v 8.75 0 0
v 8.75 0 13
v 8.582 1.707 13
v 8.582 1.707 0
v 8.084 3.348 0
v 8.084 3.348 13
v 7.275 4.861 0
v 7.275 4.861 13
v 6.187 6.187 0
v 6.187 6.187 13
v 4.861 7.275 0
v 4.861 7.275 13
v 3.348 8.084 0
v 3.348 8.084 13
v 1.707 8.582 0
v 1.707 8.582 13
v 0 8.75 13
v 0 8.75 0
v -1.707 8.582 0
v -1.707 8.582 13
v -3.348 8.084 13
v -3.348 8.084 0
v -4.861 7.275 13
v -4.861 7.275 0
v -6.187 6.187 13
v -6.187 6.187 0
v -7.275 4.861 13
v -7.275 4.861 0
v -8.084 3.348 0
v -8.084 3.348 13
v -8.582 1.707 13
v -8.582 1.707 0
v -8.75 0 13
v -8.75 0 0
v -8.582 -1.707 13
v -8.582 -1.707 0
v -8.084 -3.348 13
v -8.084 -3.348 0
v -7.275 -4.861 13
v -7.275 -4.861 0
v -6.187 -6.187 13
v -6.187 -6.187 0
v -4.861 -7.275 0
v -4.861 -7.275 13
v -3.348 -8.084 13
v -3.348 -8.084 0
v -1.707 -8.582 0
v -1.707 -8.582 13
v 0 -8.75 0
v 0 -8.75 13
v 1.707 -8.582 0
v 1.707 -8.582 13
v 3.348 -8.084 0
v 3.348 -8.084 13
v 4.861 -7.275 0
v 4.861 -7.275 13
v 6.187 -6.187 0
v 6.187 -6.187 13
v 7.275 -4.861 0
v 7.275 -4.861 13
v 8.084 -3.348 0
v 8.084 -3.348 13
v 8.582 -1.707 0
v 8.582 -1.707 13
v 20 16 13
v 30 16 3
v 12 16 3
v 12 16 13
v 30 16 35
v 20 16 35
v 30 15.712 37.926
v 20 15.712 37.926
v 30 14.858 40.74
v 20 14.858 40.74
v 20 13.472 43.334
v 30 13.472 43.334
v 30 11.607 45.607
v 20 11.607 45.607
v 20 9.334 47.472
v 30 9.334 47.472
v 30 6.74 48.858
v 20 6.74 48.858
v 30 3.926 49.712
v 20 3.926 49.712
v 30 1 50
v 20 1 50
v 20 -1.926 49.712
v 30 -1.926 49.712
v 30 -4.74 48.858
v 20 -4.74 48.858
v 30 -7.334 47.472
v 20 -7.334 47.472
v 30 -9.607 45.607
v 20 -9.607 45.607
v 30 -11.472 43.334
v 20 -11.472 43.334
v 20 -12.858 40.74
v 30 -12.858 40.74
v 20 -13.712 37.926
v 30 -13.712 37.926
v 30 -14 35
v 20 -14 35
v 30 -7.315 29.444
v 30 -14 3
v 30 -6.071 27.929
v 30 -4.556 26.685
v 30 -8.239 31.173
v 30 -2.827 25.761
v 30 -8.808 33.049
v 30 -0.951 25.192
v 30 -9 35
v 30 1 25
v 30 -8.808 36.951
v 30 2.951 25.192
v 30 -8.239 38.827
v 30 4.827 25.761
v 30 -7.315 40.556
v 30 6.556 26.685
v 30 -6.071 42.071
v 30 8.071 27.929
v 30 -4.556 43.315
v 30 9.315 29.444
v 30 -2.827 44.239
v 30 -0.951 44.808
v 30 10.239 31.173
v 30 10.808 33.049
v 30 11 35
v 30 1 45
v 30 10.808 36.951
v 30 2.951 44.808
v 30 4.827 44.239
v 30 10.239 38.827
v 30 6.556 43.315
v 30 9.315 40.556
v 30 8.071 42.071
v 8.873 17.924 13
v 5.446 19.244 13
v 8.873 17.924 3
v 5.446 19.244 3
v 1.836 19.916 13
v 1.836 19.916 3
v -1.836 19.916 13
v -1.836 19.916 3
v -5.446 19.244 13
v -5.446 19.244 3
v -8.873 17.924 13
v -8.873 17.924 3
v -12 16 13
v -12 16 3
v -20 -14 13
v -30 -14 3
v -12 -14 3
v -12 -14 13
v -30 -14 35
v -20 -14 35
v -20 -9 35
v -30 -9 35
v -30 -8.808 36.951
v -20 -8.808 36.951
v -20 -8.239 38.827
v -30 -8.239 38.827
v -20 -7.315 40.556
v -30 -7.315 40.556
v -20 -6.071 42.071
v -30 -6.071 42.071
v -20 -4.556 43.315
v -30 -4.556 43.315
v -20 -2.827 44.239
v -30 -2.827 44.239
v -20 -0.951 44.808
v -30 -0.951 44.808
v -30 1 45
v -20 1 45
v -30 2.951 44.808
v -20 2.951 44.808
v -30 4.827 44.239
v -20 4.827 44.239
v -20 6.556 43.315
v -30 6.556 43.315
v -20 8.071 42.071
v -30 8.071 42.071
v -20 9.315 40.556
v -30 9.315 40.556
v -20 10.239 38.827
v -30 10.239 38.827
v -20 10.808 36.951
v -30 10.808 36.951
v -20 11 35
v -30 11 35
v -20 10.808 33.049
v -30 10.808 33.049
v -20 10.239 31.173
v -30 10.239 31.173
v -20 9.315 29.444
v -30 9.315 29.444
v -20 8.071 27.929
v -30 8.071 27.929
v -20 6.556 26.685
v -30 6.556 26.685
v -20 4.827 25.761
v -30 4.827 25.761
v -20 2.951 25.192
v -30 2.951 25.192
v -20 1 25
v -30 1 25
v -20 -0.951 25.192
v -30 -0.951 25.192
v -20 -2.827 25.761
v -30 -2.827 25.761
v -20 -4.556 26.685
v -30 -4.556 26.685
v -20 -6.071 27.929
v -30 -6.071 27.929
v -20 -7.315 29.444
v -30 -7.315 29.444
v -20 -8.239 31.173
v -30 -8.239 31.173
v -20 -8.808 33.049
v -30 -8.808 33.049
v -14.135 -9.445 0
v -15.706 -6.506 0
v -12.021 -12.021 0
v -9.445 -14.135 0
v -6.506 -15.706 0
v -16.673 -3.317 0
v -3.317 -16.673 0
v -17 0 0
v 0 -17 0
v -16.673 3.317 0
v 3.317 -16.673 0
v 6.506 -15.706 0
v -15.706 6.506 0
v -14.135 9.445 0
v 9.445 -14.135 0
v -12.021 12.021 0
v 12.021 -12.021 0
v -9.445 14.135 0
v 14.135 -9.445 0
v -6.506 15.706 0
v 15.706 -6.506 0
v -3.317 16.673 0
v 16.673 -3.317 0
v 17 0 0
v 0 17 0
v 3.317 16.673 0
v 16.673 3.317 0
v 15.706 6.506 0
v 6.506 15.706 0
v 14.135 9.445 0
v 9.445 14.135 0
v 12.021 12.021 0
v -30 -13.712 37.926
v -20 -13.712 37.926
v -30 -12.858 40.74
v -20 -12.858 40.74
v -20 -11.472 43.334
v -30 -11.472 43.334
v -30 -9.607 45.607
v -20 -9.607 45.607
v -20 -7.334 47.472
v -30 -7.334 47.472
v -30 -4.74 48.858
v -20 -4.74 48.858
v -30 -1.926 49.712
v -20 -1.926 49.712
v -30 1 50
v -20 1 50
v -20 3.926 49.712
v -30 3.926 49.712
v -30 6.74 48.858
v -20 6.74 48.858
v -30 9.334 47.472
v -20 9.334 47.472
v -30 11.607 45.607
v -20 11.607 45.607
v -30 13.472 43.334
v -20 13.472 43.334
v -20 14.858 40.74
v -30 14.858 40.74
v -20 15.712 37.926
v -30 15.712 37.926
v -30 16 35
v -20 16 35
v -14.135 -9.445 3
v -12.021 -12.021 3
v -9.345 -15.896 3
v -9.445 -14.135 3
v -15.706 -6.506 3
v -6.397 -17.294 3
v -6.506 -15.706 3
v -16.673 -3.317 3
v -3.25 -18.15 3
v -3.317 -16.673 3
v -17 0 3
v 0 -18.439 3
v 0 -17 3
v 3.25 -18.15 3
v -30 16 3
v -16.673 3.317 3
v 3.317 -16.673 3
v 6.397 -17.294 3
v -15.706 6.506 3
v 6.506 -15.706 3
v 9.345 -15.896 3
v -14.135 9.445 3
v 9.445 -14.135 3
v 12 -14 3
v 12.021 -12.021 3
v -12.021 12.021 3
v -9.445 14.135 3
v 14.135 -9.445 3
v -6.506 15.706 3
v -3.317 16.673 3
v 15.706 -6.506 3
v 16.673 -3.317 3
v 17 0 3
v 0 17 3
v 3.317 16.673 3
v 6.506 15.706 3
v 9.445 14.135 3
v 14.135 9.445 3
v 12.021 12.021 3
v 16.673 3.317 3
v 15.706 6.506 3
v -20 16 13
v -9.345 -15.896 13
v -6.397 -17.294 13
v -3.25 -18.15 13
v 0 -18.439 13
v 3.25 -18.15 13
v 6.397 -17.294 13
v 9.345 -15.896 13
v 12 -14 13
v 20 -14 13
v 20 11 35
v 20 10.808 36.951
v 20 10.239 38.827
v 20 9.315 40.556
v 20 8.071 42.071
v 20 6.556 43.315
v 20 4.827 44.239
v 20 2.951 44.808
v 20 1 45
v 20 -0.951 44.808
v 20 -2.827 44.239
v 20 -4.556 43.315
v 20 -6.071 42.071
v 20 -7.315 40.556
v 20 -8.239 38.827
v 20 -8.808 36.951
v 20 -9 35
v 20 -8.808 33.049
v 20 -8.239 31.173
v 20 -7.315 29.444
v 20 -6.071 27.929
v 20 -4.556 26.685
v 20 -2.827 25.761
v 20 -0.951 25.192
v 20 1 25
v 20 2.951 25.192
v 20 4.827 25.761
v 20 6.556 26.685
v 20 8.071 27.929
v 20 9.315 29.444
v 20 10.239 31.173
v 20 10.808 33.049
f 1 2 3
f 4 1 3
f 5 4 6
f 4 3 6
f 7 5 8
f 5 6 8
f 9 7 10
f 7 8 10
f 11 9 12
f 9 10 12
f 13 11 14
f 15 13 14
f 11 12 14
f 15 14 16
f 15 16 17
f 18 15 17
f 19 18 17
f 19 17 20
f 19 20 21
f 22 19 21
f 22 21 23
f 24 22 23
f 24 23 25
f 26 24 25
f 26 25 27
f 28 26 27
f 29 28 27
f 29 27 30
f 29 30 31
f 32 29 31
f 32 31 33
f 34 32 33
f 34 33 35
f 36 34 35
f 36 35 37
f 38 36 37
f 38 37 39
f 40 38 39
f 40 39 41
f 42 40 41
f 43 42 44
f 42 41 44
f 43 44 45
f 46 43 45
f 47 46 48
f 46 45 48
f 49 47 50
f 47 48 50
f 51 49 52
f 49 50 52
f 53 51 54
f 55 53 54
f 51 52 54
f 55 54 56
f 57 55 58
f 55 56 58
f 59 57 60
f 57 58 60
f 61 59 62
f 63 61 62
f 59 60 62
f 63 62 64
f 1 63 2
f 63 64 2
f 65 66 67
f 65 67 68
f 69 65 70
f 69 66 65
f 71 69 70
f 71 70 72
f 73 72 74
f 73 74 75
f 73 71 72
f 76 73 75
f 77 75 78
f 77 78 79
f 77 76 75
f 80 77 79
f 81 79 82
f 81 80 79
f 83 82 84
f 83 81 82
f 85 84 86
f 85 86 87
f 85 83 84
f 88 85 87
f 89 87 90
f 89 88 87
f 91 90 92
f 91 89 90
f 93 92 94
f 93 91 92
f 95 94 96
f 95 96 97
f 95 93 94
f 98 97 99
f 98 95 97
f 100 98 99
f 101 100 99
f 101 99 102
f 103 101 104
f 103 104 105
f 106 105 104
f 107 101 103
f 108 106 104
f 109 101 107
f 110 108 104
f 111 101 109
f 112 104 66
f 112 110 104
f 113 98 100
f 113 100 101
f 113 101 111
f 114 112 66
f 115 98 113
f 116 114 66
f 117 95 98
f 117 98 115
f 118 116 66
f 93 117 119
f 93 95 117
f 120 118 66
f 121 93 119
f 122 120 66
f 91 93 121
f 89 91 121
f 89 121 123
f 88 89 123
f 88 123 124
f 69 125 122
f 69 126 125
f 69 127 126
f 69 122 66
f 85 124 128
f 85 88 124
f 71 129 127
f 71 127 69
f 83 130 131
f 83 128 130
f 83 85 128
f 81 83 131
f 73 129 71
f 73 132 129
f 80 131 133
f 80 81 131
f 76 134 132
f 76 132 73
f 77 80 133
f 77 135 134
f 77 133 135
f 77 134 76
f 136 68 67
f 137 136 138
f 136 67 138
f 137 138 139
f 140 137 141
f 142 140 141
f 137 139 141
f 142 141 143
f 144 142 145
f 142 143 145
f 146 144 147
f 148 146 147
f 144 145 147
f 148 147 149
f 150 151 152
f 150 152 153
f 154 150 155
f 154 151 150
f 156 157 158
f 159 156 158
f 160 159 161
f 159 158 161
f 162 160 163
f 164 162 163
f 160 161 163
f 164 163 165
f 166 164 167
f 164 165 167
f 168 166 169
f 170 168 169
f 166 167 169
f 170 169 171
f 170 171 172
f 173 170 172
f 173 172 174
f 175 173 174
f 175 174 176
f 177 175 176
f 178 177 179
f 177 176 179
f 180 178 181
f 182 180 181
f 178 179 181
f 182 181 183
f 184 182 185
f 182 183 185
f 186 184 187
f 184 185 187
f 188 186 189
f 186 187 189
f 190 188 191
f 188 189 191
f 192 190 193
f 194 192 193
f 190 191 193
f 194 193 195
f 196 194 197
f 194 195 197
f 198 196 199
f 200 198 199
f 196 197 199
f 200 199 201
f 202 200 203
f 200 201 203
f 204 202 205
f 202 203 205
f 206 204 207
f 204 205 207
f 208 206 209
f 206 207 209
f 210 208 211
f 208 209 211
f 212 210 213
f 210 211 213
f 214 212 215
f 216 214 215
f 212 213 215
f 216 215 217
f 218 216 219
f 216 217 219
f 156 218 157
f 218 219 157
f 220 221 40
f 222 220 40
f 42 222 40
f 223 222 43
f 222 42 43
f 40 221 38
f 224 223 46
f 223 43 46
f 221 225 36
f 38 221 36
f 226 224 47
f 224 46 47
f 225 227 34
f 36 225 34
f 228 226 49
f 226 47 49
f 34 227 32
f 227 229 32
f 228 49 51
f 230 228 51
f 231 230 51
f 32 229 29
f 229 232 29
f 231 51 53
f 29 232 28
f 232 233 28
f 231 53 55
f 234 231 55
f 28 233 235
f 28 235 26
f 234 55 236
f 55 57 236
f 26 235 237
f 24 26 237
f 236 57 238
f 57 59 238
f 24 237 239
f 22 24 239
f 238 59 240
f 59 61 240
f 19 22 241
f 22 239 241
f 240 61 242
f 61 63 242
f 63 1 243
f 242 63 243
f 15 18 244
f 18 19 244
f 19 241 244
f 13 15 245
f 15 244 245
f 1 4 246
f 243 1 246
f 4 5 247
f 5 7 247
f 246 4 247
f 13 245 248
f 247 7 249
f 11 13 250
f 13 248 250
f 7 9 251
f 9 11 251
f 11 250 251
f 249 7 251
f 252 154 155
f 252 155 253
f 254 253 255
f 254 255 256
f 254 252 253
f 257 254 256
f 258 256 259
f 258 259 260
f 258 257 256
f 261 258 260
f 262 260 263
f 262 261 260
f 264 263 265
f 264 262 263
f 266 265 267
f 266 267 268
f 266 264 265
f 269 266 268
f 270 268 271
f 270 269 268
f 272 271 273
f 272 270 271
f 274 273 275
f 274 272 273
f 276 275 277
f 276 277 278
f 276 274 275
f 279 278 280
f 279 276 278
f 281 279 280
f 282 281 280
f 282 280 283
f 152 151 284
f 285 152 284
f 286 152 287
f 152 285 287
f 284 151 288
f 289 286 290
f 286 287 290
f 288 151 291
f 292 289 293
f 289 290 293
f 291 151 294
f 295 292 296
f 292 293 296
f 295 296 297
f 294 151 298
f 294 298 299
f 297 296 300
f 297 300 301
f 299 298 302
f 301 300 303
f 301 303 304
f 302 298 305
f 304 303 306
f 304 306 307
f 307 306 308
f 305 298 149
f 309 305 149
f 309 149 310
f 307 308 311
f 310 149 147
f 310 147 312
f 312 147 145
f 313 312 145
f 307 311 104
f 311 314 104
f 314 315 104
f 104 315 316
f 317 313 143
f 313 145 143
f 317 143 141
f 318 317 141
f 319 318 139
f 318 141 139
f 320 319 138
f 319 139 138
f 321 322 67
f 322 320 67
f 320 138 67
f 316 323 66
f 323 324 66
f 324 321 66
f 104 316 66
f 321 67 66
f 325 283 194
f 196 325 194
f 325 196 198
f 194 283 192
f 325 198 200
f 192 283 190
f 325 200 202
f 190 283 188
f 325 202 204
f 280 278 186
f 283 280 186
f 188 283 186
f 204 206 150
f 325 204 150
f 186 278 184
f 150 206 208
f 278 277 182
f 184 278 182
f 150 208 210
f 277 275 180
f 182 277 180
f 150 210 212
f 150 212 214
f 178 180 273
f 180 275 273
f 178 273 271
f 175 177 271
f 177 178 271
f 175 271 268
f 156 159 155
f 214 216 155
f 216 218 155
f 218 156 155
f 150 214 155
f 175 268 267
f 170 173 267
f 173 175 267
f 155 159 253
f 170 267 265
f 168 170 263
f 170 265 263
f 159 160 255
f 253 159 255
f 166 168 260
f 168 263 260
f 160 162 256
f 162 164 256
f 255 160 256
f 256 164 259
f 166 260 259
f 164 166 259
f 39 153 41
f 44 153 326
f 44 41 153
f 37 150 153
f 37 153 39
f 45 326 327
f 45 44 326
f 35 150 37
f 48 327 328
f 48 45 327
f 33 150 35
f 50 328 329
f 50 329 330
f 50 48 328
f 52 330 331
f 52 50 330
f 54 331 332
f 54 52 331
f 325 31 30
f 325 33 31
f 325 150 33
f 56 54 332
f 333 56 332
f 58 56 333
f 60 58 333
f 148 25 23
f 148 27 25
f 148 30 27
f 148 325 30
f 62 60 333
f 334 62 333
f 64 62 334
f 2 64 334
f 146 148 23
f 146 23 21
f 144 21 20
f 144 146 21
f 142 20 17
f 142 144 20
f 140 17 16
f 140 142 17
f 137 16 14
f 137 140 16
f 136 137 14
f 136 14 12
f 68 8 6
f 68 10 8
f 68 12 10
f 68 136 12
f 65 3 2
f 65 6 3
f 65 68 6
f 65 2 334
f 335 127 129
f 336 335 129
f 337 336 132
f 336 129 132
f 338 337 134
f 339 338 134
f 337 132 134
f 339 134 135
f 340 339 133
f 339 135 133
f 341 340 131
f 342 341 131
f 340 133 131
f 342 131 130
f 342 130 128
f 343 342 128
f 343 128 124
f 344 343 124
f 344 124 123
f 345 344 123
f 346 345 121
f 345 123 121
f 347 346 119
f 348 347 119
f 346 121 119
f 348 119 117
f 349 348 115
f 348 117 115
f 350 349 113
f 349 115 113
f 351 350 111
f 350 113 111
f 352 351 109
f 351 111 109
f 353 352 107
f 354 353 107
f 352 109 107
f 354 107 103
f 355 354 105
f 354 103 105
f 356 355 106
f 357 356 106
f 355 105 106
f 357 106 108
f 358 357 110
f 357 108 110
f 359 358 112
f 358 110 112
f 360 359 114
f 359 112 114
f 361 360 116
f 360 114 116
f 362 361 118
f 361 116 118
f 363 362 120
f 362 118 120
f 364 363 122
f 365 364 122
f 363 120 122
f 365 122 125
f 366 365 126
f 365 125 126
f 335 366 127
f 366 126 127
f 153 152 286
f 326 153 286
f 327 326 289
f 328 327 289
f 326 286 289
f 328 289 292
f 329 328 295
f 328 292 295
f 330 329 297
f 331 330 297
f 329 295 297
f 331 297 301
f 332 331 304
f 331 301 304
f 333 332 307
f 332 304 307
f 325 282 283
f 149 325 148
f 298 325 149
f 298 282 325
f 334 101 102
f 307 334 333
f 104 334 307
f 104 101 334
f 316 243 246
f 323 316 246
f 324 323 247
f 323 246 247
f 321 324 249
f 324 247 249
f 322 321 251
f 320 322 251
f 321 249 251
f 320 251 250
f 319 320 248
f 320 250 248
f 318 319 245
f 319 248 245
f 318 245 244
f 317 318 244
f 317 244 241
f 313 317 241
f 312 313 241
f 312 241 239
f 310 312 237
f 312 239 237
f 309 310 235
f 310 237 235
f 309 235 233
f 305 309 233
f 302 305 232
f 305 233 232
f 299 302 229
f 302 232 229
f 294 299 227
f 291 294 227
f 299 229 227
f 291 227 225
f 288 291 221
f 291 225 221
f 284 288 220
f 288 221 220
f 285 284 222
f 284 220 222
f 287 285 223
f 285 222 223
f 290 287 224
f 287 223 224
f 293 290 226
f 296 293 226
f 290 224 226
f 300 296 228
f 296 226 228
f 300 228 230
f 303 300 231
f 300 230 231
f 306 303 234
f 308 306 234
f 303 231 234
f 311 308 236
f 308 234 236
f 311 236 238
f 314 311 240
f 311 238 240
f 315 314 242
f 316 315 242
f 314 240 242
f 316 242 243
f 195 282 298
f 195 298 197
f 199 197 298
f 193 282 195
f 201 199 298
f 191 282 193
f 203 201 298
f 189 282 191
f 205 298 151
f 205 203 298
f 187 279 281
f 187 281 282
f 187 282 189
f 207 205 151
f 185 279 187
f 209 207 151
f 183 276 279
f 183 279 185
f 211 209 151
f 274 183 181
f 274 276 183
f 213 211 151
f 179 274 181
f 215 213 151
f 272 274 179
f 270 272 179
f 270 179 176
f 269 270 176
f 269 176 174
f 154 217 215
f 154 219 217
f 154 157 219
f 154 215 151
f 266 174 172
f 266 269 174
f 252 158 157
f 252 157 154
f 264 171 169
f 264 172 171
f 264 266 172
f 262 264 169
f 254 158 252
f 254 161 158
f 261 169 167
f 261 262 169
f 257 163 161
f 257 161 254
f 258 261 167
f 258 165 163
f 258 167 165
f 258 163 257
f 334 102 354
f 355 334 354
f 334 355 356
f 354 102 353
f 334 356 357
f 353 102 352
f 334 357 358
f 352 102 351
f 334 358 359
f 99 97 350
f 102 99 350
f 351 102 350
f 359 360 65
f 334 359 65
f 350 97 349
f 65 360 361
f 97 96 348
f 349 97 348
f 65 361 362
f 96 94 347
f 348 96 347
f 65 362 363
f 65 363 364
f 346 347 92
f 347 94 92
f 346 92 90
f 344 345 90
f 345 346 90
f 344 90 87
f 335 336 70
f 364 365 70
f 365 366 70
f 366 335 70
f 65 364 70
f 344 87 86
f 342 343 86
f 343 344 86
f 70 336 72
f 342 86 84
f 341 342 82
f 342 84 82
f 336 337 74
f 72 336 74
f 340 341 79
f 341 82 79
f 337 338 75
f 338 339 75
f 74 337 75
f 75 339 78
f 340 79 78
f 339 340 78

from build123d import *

# Parameters (mm, degrees)
F0_R     = 17
F1_DEPTH = 3
F3_DEPTH = 10
F4_R     = 10
F5_DEPTH = 10
F6_R     = 10
F7_DEPTH = 10
F8_R     = 8.75
F9_DEPTH = 13.001


with BuildPart() as f1:
    # F0 (on Top) → F1 (new body)
    with BuildSketch(Plane.XY):
        Circle(F0_R)
    extrude(amount=F1_DEPTH)

    # F2 (on face) → F3 (join)
    with BuildSketch(Plane.XY.offset(3)):
        Polygon((-12, 16), (-30, 16), (-30, -14), (-12, -14), (12, -14), (30, -14), (30, 16), (12, 16), align=None)
        with BuildLine():
            ThreePointArc((12, 16), (0, 20), (-12, 16))
            Line((-12, 16), (12, 16))
        make_face()
        with BuildLine():
            Line((12, -14), (-12, -14))
            ThreePointArc((-12, -14), (0, -18.4390889146), (12, -14))
        make_face()
    extrude(amount=F3_DEPTH)

    # F4 (on face) → F5 (join)
    with BuildSketch(Plane.YZ.offset(30)):
        with BuildLine():
            Line((-14, 35), (-14, 13))
            Line((-14, 13), (16, 13))
            Line((16, 13), (16, 35))
            ThreePointArc((16, 35), (1, 50), (-14, 35))
        make_face()
        with Locations((1, 35)):
            Circle(F4_R, mode=Mode.SUBTRACT)
    extrude(amount=-F5_DEPTH)

    # F6 (on face) → F7 (join)
    with BuildSketch(Plane(origin=(-30, 0, 0), x_dir=(0, -1, 0), z_dir=(-1, 0, 0))):
        with BuildLine():
            Line((-16, 35), (-16, 13))
            Line((-16, 13), (14, 13))
            Line((14, 13), (14, 35))
            ThreePointArc((14, 35), (-1, 50), (-16, 35))
        make_face()
        with Locations((-1, 35)):
            Circle(F6_R, mode=Mode.SUBTRACT)
    extrude(amount=-F7_DEPTH)

    # F8 (on face) → F9 (cut, through all)
    with BuildSketch(Plane.XY.offset(13)):
        Circle(F8_R)
    extrude(amount=-F9_DEPTH, mode=Mode.SUBTRACT)


solid = f1.part
